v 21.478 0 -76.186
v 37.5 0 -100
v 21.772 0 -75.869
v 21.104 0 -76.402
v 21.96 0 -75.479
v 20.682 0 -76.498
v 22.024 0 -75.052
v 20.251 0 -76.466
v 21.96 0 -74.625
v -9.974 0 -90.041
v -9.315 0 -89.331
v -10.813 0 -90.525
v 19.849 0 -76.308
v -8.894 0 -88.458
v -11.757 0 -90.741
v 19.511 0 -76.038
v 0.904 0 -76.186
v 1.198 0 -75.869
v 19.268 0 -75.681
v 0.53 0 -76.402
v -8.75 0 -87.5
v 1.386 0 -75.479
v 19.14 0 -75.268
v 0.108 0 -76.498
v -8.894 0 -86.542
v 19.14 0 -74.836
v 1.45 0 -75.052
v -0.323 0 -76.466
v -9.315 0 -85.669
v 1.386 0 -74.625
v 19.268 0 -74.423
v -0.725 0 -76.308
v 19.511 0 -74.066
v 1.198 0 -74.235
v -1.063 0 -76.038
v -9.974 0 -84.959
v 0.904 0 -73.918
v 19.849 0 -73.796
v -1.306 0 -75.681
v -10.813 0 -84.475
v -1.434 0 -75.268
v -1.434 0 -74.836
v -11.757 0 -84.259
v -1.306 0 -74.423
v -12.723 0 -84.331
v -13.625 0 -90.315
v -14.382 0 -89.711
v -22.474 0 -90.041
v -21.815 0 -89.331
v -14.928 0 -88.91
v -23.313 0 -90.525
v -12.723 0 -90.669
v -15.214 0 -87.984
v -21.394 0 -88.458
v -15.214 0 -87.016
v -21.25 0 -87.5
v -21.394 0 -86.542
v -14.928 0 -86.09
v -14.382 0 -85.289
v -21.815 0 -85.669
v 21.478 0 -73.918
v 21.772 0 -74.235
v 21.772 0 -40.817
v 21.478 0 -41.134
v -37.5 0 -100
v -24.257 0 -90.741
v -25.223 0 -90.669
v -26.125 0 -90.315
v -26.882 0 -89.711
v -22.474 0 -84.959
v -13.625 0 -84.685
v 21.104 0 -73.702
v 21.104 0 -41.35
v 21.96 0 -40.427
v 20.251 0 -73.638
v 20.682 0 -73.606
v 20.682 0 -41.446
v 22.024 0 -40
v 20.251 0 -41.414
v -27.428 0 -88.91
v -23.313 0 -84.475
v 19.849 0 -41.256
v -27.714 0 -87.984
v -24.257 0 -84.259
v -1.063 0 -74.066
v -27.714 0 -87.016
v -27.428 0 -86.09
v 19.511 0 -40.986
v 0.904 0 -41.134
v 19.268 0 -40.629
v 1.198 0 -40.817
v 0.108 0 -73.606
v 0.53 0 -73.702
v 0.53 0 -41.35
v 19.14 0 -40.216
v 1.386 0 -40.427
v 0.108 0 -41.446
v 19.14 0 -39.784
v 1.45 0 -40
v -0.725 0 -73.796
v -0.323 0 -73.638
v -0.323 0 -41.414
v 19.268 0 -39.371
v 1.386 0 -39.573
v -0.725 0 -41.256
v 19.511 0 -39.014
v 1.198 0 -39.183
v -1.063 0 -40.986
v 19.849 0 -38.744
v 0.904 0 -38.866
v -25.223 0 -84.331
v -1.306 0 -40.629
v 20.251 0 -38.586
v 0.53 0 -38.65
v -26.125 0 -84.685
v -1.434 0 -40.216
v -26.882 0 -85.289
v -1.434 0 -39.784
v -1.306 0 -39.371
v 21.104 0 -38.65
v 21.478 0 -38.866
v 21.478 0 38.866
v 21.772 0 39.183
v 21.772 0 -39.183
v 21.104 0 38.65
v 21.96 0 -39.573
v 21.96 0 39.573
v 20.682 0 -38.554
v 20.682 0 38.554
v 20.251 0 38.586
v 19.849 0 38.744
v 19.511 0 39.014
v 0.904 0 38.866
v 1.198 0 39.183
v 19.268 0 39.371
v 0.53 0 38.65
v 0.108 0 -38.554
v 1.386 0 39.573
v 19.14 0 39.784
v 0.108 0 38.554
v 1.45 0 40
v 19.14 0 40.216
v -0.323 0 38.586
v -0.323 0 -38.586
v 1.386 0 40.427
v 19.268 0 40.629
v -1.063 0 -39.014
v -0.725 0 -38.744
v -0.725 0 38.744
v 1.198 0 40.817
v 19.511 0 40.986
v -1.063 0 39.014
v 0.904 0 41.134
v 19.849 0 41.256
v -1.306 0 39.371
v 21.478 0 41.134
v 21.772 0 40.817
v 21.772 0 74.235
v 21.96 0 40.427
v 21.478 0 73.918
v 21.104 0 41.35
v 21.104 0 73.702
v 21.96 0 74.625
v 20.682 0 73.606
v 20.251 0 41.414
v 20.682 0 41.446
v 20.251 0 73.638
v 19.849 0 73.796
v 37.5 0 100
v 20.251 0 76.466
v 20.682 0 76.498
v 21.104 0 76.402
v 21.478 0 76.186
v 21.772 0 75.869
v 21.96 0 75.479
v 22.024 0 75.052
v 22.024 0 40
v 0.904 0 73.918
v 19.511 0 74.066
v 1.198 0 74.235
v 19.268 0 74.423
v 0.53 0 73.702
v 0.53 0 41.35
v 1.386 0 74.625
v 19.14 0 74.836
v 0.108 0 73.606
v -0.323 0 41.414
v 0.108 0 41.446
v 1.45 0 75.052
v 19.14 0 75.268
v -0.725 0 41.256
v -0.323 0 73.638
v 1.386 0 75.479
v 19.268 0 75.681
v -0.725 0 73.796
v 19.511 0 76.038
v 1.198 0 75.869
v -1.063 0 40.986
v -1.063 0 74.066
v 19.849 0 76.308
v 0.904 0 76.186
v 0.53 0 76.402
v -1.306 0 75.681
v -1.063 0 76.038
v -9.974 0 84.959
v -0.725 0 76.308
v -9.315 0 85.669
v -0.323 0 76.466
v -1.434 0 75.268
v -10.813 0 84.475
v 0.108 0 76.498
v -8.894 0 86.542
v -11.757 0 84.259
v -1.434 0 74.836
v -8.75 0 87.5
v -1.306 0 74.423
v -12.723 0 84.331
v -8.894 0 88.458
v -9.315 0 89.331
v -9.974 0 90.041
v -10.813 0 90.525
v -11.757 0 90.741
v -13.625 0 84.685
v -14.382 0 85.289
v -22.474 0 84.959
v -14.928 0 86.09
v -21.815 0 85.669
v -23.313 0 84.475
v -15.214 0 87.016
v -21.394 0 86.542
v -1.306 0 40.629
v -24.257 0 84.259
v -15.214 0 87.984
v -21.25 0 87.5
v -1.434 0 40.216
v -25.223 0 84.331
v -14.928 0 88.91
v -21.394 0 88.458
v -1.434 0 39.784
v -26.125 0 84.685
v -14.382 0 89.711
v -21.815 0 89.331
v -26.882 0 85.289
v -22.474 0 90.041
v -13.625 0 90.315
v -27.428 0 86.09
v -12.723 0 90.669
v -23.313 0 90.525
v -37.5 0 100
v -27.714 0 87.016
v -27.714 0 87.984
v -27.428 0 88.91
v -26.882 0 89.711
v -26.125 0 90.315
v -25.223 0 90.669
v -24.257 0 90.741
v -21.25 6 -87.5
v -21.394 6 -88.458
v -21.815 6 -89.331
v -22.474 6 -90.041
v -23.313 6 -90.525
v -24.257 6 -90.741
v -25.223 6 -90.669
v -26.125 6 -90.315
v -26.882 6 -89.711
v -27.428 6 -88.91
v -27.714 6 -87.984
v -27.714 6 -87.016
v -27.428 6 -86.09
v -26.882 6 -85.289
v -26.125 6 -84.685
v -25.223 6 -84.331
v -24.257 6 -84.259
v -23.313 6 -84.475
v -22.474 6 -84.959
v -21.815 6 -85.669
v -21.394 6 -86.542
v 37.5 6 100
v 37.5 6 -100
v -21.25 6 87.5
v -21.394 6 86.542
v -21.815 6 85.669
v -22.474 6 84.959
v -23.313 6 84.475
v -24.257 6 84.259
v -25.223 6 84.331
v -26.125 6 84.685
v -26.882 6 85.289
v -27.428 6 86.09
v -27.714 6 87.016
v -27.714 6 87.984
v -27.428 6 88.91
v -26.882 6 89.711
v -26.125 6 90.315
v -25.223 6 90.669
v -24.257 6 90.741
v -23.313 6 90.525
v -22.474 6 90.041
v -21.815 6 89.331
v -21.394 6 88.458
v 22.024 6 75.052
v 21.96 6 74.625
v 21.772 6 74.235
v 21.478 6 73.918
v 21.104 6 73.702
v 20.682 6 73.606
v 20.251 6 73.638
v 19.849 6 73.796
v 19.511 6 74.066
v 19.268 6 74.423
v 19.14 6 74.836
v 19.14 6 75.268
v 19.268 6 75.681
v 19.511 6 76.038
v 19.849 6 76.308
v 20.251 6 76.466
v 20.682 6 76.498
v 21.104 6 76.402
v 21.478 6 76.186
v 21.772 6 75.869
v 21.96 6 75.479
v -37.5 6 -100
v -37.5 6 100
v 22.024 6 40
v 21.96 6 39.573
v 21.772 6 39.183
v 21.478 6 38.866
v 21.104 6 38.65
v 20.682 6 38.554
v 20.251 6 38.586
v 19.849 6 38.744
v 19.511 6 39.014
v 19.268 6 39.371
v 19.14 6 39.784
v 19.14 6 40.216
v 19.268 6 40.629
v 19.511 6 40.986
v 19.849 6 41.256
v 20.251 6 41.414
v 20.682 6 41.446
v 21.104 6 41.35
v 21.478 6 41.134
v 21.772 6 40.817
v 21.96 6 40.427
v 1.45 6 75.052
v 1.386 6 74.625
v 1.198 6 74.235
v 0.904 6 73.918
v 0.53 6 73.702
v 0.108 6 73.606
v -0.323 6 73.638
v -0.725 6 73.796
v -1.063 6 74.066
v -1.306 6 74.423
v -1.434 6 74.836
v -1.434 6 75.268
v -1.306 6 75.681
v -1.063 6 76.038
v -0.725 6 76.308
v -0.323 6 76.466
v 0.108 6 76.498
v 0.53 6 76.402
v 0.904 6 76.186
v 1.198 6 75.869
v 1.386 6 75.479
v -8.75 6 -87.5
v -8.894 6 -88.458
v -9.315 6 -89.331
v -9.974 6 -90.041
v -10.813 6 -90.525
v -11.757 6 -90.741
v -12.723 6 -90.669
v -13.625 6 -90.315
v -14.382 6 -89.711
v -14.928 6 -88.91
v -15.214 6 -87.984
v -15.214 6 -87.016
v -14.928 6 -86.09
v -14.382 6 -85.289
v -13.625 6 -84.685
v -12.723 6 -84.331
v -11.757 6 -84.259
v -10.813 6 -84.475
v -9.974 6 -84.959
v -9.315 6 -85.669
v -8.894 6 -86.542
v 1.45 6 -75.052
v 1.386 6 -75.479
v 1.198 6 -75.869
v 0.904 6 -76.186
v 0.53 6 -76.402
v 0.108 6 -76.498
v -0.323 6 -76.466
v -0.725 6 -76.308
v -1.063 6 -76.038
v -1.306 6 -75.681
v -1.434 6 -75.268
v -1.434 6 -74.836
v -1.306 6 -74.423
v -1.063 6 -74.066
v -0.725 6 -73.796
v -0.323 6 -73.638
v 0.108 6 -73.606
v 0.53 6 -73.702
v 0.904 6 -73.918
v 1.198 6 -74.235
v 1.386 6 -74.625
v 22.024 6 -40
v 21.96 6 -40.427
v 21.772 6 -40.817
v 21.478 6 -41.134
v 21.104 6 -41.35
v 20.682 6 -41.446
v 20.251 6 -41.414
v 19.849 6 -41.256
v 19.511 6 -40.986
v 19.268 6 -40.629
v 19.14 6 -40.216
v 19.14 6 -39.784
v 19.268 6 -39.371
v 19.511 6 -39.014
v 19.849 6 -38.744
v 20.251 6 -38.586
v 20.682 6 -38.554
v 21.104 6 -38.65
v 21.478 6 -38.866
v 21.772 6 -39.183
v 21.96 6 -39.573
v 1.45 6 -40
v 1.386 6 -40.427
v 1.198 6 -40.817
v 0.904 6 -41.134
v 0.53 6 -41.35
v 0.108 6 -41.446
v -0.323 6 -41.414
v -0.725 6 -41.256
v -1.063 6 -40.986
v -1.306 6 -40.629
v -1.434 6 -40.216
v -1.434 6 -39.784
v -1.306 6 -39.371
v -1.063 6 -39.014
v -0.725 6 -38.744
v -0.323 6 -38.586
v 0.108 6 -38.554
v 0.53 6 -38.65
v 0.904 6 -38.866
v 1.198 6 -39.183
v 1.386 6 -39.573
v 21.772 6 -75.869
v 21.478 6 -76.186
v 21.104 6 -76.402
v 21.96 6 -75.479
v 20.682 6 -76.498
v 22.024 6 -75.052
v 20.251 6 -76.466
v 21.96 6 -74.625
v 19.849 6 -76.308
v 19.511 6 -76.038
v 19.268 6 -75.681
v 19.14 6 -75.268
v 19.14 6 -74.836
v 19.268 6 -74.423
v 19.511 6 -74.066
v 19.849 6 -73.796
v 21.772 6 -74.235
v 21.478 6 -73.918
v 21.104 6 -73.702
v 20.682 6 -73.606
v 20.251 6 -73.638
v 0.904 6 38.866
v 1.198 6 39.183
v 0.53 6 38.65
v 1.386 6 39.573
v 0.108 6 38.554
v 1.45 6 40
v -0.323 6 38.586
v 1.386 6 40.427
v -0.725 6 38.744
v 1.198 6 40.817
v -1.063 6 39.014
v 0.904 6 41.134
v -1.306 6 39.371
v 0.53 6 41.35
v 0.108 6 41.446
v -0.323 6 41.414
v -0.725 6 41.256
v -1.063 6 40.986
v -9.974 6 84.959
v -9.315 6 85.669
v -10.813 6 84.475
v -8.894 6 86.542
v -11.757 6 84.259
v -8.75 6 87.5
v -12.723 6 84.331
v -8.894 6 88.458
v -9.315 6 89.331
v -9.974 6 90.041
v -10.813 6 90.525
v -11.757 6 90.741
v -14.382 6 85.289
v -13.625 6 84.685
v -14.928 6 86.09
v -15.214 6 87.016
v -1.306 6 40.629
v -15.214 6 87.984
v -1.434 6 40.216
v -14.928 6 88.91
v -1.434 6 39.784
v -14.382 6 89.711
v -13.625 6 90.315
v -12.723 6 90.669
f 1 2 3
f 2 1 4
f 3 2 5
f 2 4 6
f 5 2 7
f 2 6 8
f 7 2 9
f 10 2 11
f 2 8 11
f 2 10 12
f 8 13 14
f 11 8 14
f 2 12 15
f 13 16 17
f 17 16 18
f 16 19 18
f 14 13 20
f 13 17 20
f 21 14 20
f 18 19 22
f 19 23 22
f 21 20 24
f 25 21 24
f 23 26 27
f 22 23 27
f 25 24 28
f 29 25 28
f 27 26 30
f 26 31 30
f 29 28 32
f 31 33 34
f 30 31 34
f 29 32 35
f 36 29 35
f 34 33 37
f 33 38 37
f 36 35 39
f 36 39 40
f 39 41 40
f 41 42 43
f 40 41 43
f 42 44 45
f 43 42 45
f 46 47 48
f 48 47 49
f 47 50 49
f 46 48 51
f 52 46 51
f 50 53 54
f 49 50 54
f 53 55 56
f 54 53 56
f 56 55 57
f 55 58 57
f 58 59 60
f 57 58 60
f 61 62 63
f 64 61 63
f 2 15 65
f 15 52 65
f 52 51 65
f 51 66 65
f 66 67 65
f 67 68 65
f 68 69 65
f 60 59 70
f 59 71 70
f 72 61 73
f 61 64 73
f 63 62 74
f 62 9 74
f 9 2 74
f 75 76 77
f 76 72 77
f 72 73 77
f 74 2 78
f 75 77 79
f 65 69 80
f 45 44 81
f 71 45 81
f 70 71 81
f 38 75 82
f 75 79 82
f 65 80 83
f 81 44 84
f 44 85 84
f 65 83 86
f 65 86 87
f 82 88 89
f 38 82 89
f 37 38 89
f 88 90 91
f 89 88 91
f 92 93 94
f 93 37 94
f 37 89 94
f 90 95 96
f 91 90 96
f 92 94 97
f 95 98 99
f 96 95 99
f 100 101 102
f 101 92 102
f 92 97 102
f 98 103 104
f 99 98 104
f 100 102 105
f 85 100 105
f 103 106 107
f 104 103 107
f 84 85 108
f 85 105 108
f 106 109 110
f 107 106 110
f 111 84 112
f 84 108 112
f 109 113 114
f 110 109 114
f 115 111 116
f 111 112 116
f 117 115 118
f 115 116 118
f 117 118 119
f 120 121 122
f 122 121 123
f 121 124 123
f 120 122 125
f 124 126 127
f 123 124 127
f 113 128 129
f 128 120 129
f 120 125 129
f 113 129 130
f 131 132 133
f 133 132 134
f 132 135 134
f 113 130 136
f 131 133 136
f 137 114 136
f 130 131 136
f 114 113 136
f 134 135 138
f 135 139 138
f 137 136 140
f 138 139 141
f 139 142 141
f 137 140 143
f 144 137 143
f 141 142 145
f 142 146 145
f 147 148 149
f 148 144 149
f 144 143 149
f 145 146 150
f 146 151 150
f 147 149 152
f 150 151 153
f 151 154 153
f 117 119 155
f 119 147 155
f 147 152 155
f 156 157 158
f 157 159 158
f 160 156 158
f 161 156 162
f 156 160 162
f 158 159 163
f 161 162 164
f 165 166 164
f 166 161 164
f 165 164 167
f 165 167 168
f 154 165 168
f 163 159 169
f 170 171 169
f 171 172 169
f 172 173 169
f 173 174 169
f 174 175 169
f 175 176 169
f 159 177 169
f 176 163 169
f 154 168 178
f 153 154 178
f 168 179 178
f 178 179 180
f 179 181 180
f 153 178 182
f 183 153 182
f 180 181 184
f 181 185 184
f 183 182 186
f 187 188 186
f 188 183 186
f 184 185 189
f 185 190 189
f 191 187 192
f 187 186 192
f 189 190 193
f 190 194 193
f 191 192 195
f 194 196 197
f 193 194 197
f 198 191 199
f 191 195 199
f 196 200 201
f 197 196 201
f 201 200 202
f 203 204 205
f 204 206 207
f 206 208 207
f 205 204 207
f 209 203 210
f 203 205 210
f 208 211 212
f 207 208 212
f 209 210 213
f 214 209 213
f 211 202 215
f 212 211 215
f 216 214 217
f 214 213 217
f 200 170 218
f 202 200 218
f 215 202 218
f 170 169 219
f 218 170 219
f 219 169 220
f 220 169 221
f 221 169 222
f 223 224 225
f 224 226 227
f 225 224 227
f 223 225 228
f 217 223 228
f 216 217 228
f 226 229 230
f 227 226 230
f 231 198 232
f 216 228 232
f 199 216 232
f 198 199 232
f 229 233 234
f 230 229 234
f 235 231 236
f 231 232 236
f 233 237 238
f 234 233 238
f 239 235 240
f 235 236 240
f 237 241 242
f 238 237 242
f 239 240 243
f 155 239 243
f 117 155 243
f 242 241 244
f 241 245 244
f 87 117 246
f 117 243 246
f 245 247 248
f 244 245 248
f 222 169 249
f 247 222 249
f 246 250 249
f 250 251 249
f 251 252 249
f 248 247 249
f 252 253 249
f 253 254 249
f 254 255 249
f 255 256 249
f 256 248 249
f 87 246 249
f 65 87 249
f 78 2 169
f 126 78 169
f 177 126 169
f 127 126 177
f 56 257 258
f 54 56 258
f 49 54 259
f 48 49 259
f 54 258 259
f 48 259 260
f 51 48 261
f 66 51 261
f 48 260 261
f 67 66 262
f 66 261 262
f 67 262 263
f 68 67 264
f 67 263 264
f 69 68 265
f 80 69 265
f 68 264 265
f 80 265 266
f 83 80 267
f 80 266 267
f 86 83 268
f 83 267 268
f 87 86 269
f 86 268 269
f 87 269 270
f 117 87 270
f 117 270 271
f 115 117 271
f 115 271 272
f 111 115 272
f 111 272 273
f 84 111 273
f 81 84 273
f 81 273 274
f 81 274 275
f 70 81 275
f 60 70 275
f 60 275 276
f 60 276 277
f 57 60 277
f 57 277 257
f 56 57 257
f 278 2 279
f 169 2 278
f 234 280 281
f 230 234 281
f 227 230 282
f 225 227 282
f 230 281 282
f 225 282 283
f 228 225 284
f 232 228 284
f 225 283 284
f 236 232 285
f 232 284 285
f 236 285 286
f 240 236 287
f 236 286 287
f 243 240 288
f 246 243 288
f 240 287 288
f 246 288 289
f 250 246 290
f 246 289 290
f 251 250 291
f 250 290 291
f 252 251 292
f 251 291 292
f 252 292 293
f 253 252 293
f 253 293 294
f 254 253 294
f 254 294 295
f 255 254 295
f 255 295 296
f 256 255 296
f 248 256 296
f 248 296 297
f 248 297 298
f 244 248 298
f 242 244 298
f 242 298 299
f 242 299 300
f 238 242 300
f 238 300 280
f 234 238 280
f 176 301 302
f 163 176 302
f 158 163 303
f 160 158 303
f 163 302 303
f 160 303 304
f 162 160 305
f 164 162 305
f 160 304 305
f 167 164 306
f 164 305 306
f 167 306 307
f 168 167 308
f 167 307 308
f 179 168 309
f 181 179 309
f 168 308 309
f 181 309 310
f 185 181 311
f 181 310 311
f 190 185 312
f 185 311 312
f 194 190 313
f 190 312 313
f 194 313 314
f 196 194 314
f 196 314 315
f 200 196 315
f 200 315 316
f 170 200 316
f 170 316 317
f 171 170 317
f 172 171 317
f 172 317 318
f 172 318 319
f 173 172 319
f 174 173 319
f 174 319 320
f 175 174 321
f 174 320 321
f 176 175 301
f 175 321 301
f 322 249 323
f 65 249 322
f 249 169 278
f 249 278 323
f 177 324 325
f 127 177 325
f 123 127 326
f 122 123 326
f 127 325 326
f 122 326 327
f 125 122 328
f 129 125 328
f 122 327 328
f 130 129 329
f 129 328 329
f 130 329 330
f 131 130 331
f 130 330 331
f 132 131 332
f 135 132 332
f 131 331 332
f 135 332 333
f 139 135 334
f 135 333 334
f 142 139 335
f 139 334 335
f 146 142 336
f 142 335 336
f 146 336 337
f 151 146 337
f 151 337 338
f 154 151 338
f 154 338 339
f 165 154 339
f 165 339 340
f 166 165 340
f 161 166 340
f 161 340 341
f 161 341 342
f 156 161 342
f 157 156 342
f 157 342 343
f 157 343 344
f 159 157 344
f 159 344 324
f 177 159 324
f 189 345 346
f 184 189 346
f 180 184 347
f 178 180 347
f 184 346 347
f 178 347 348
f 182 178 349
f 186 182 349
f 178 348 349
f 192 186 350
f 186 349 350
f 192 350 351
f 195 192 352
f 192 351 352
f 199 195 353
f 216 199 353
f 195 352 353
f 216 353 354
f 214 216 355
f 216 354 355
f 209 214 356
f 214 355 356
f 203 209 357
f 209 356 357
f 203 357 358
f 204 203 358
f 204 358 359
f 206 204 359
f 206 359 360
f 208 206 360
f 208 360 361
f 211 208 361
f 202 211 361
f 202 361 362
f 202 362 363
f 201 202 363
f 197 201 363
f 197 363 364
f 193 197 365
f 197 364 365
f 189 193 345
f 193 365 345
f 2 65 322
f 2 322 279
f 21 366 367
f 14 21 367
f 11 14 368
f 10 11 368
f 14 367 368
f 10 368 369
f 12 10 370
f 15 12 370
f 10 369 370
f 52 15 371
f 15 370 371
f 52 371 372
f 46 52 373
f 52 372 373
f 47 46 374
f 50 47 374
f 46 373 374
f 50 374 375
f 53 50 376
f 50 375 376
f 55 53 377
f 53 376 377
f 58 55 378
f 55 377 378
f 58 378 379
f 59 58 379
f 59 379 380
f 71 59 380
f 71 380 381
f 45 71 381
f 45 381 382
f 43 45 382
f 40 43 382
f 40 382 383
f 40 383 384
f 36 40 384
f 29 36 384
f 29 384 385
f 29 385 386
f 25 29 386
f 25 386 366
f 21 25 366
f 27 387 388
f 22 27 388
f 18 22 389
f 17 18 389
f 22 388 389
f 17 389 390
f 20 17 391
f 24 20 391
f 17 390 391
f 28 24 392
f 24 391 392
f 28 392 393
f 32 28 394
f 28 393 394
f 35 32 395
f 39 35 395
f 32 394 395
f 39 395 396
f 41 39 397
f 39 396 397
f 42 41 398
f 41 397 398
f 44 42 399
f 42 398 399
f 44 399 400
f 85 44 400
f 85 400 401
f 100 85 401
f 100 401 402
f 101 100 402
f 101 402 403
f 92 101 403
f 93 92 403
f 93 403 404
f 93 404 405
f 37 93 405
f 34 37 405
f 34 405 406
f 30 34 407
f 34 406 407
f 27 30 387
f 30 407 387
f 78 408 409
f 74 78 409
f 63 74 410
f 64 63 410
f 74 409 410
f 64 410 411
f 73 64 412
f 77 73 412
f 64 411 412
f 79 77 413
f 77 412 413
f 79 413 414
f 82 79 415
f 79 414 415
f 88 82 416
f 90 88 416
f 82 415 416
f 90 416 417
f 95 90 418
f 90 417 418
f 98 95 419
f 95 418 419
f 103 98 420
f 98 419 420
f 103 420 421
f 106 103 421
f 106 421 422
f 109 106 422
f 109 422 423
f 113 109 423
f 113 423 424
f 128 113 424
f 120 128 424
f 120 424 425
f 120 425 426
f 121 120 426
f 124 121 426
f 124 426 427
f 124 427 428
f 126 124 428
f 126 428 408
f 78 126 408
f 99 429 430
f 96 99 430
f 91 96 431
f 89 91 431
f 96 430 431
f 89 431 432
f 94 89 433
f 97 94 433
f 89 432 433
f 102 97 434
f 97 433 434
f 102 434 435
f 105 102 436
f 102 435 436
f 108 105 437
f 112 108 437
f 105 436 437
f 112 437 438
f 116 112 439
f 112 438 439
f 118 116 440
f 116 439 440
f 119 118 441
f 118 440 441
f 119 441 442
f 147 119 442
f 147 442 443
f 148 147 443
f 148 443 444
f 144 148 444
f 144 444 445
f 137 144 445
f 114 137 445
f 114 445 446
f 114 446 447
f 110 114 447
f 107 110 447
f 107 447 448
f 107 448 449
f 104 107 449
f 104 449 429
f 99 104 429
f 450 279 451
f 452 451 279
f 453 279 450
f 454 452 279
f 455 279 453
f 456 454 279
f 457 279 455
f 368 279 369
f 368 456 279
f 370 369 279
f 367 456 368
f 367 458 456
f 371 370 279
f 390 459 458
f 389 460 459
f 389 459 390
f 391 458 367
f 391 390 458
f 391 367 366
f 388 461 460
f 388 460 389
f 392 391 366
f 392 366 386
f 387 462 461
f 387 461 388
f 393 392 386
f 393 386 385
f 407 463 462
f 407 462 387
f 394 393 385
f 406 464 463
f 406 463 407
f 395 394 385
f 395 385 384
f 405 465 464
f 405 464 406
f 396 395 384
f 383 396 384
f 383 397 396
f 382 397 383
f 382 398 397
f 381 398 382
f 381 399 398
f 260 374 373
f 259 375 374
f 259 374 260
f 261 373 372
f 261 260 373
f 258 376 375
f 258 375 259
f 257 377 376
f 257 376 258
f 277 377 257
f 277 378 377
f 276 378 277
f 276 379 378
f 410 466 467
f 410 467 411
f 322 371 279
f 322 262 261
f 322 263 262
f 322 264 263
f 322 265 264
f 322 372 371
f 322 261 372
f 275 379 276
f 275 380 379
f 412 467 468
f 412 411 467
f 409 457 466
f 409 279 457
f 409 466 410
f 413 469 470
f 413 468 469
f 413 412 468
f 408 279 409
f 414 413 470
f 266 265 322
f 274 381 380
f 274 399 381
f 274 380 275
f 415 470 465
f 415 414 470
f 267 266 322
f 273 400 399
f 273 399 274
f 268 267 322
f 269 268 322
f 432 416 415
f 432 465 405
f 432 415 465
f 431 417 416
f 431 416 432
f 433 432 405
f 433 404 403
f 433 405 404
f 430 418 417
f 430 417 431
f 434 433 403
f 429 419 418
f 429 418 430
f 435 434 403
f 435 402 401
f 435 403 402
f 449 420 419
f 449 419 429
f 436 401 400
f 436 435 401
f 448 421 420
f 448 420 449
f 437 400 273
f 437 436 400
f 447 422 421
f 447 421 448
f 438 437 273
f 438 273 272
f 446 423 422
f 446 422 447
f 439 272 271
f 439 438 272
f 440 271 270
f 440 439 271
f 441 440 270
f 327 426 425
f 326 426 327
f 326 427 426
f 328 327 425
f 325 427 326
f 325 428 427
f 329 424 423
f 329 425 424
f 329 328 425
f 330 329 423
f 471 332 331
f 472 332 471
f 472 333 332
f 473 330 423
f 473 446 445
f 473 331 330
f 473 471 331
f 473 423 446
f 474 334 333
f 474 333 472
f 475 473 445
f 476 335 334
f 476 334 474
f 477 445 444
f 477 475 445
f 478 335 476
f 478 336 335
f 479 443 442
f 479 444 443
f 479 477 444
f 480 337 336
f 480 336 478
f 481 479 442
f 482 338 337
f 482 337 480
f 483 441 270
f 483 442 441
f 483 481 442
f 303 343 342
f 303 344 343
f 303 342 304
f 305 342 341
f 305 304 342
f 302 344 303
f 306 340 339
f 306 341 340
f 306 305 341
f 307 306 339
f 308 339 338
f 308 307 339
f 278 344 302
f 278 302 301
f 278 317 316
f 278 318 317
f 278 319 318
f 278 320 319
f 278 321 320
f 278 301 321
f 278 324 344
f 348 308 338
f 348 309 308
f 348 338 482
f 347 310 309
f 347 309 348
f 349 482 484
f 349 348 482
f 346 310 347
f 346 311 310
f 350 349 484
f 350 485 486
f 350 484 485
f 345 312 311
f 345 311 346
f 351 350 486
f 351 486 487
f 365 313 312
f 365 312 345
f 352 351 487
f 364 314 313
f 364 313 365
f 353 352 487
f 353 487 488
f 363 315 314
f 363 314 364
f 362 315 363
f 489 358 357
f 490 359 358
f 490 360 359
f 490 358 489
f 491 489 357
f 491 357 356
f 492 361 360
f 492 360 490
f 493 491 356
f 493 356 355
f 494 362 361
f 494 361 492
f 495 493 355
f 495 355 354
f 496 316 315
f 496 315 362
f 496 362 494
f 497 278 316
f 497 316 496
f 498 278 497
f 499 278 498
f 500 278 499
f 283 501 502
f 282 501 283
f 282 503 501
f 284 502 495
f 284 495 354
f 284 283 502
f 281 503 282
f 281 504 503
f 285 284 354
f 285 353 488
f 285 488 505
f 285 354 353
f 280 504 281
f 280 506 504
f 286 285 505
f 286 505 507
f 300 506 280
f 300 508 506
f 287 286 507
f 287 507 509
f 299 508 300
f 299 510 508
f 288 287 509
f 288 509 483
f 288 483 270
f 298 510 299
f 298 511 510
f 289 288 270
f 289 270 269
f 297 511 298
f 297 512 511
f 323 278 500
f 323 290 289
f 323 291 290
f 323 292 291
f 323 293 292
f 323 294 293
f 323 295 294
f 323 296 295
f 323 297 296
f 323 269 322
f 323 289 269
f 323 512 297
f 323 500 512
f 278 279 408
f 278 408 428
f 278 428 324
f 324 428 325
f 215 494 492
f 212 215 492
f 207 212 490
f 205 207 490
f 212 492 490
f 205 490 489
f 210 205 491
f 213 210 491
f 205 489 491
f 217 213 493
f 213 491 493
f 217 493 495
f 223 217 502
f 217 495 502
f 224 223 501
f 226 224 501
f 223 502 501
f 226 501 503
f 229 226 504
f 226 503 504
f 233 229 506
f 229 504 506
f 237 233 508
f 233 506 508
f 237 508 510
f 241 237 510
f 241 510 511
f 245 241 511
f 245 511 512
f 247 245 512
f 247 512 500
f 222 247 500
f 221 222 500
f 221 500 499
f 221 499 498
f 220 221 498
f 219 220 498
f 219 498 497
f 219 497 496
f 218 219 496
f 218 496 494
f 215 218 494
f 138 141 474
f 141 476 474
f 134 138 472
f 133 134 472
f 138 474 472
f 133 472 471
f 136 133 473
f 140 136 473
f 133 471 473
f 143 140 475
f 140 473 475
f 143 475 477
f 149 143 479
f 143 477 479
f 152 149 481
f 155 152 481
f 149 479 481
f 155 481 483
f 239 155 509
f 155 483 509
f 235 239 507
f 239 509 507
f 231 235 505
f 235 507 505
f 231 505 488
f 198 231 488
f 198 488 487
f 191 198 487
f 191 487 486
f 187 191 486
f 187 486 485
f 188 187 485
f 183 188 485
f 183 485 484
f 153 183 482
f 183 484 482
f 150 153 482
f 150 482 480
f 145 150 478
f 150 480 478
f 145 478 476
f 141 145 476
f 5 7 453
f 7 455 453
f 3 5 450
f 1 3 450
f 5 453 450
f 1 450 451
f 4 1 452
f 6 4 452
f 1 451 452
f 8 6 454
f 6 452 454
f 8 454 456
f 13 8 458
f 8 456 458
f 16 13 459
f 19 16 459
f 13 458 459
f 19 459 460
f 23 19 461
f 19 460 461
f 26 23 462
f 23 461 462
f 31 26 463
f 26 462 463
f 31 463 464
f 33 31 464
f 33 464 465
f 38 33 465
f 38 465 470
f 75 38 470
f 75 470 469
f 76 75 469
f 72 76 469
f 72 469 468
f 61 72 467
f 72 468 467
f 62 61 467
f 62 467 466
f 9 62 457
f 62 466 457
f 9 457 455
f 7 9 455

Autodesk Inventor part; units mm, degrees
ref_plane "YZ Plane" through (0, 0, 0) normal (1, 0, 0) x (0, 1, 0)
ref_plane "XZ Plane" through (0, 0, 0) normal (0, 1, 0) x (-1, 0, 0)
ref_plane "XY Plane" through (0, 0, 0) normal (0, 0, 1) x (1, 0, 0)
sketch "Sketch1" plane through (0, 0, 0) normal (0, 1, 0) x (-1, 0, 0)
  line L0 (-37.5, 100) -> (37.5, 100)
  line L1 (37.5, 100) -> (37.5, -100)
  line L2 (37.5, -100) -> (-37.5, -100)
  line L3 (-37.5, -100) -> (-37.5, 100)
  line L4 (-37.5, 100) -> (37.5, -100) construction
  line L5 (37.5, 100) -> (-37.5, -100) construction
  point P0 (0, 0)
  dimension "d0" = 200
  dimension "d1" = 75
extrude "Extrusion1" add sketch "Sketch1" along normal blind 6
sketch "Sketch2" plane through (0, 6, 0) normal (0, 1, 0) x (1, 0, 0)
  circle A0 centre (-24.5, -87.5) radius 3.25
  circle A1 centre (-12, -87.5) radius 3.25
  circle A2 centre (-24.5, 87.5) radius 3.25
  circle A3 centre (-12, 87.5) radius 3.25
  line L0 (-37.5, 100) -> (-37.5, -100) projected
  line L1 (-37.5, -100) -> (37.5, -100) projected
  line L2 (37.5, 100) -> (-37.5, 100) projected
  point P0 (0, 0)
  dimension "d4" = 6.5
  dimension "d5" = 6.5
  dimension "d6" = 12.5
  dimension "d7" = 13
  dimension "d8" = 12.5
  dimension "d9" = 12.5
  dimension "d10" = 6.5
  dimension "d11" = 6.5
  dimension "d12" = 12.5
  dimension "d13" = 13
  dimension "d14" = 12.5
  dimension "d15" = 12.5
extrude "Extrusion2" cut sketch "Sketch2" against normal through all
sketch "Sketch3" plane through (0, 6, 0) normal (0, 1, 0) x (1, 0, 0)
  circle A0 centre (0, -75.052) radius 1.45
  circle A1 centre (20.574, -75.052) radius 1.45
  circle A2 centre (0, -40) radius 1.45
  circle A3 centre (20.574, -40) radius 1.45
  circle A4 centre (0, 40) radius 1.45
  circle A5 centre (20.574, 40) radius 1.45
  circle A6 centre (0, 75.052) radius 1.45
  circle A7 centre (20.574, 75.052) radius 1.45
  point P0 (0, 0)
  dimension "d18" = 2.9
  dimension "d19" = 2.9
  dimension "d20" = 2.9
  dimension "d21" = 2.9
  dimension "d22" = 20.574
  dimension "d23" = 35.052
  dimension "d24" = 35.052
  dimension "d25" = 20.574
  dimension "d26" = 0
  dimension "d27" = 40
  dimension "d28" = 2.9
  dimension "d29" = 2.9
  dimension "d30" = 2.9
  dimension "d31" = 2.9
  dimension "d32" = 20.574
  dimension "d33" = 35.052
  dimension "d34" = 35.052
  dimension "d35" = 20.574
  dimension "d36" = 0
  dimension "d37" = 0
  dimension "d38" = 40
  dimension "d39" = 40
  dimension "d42" = 0
  dimension "d43" = 40
extrude "Extrusion3" cut sketch "Sketch3" against normal through all
properties part number "shelf"
